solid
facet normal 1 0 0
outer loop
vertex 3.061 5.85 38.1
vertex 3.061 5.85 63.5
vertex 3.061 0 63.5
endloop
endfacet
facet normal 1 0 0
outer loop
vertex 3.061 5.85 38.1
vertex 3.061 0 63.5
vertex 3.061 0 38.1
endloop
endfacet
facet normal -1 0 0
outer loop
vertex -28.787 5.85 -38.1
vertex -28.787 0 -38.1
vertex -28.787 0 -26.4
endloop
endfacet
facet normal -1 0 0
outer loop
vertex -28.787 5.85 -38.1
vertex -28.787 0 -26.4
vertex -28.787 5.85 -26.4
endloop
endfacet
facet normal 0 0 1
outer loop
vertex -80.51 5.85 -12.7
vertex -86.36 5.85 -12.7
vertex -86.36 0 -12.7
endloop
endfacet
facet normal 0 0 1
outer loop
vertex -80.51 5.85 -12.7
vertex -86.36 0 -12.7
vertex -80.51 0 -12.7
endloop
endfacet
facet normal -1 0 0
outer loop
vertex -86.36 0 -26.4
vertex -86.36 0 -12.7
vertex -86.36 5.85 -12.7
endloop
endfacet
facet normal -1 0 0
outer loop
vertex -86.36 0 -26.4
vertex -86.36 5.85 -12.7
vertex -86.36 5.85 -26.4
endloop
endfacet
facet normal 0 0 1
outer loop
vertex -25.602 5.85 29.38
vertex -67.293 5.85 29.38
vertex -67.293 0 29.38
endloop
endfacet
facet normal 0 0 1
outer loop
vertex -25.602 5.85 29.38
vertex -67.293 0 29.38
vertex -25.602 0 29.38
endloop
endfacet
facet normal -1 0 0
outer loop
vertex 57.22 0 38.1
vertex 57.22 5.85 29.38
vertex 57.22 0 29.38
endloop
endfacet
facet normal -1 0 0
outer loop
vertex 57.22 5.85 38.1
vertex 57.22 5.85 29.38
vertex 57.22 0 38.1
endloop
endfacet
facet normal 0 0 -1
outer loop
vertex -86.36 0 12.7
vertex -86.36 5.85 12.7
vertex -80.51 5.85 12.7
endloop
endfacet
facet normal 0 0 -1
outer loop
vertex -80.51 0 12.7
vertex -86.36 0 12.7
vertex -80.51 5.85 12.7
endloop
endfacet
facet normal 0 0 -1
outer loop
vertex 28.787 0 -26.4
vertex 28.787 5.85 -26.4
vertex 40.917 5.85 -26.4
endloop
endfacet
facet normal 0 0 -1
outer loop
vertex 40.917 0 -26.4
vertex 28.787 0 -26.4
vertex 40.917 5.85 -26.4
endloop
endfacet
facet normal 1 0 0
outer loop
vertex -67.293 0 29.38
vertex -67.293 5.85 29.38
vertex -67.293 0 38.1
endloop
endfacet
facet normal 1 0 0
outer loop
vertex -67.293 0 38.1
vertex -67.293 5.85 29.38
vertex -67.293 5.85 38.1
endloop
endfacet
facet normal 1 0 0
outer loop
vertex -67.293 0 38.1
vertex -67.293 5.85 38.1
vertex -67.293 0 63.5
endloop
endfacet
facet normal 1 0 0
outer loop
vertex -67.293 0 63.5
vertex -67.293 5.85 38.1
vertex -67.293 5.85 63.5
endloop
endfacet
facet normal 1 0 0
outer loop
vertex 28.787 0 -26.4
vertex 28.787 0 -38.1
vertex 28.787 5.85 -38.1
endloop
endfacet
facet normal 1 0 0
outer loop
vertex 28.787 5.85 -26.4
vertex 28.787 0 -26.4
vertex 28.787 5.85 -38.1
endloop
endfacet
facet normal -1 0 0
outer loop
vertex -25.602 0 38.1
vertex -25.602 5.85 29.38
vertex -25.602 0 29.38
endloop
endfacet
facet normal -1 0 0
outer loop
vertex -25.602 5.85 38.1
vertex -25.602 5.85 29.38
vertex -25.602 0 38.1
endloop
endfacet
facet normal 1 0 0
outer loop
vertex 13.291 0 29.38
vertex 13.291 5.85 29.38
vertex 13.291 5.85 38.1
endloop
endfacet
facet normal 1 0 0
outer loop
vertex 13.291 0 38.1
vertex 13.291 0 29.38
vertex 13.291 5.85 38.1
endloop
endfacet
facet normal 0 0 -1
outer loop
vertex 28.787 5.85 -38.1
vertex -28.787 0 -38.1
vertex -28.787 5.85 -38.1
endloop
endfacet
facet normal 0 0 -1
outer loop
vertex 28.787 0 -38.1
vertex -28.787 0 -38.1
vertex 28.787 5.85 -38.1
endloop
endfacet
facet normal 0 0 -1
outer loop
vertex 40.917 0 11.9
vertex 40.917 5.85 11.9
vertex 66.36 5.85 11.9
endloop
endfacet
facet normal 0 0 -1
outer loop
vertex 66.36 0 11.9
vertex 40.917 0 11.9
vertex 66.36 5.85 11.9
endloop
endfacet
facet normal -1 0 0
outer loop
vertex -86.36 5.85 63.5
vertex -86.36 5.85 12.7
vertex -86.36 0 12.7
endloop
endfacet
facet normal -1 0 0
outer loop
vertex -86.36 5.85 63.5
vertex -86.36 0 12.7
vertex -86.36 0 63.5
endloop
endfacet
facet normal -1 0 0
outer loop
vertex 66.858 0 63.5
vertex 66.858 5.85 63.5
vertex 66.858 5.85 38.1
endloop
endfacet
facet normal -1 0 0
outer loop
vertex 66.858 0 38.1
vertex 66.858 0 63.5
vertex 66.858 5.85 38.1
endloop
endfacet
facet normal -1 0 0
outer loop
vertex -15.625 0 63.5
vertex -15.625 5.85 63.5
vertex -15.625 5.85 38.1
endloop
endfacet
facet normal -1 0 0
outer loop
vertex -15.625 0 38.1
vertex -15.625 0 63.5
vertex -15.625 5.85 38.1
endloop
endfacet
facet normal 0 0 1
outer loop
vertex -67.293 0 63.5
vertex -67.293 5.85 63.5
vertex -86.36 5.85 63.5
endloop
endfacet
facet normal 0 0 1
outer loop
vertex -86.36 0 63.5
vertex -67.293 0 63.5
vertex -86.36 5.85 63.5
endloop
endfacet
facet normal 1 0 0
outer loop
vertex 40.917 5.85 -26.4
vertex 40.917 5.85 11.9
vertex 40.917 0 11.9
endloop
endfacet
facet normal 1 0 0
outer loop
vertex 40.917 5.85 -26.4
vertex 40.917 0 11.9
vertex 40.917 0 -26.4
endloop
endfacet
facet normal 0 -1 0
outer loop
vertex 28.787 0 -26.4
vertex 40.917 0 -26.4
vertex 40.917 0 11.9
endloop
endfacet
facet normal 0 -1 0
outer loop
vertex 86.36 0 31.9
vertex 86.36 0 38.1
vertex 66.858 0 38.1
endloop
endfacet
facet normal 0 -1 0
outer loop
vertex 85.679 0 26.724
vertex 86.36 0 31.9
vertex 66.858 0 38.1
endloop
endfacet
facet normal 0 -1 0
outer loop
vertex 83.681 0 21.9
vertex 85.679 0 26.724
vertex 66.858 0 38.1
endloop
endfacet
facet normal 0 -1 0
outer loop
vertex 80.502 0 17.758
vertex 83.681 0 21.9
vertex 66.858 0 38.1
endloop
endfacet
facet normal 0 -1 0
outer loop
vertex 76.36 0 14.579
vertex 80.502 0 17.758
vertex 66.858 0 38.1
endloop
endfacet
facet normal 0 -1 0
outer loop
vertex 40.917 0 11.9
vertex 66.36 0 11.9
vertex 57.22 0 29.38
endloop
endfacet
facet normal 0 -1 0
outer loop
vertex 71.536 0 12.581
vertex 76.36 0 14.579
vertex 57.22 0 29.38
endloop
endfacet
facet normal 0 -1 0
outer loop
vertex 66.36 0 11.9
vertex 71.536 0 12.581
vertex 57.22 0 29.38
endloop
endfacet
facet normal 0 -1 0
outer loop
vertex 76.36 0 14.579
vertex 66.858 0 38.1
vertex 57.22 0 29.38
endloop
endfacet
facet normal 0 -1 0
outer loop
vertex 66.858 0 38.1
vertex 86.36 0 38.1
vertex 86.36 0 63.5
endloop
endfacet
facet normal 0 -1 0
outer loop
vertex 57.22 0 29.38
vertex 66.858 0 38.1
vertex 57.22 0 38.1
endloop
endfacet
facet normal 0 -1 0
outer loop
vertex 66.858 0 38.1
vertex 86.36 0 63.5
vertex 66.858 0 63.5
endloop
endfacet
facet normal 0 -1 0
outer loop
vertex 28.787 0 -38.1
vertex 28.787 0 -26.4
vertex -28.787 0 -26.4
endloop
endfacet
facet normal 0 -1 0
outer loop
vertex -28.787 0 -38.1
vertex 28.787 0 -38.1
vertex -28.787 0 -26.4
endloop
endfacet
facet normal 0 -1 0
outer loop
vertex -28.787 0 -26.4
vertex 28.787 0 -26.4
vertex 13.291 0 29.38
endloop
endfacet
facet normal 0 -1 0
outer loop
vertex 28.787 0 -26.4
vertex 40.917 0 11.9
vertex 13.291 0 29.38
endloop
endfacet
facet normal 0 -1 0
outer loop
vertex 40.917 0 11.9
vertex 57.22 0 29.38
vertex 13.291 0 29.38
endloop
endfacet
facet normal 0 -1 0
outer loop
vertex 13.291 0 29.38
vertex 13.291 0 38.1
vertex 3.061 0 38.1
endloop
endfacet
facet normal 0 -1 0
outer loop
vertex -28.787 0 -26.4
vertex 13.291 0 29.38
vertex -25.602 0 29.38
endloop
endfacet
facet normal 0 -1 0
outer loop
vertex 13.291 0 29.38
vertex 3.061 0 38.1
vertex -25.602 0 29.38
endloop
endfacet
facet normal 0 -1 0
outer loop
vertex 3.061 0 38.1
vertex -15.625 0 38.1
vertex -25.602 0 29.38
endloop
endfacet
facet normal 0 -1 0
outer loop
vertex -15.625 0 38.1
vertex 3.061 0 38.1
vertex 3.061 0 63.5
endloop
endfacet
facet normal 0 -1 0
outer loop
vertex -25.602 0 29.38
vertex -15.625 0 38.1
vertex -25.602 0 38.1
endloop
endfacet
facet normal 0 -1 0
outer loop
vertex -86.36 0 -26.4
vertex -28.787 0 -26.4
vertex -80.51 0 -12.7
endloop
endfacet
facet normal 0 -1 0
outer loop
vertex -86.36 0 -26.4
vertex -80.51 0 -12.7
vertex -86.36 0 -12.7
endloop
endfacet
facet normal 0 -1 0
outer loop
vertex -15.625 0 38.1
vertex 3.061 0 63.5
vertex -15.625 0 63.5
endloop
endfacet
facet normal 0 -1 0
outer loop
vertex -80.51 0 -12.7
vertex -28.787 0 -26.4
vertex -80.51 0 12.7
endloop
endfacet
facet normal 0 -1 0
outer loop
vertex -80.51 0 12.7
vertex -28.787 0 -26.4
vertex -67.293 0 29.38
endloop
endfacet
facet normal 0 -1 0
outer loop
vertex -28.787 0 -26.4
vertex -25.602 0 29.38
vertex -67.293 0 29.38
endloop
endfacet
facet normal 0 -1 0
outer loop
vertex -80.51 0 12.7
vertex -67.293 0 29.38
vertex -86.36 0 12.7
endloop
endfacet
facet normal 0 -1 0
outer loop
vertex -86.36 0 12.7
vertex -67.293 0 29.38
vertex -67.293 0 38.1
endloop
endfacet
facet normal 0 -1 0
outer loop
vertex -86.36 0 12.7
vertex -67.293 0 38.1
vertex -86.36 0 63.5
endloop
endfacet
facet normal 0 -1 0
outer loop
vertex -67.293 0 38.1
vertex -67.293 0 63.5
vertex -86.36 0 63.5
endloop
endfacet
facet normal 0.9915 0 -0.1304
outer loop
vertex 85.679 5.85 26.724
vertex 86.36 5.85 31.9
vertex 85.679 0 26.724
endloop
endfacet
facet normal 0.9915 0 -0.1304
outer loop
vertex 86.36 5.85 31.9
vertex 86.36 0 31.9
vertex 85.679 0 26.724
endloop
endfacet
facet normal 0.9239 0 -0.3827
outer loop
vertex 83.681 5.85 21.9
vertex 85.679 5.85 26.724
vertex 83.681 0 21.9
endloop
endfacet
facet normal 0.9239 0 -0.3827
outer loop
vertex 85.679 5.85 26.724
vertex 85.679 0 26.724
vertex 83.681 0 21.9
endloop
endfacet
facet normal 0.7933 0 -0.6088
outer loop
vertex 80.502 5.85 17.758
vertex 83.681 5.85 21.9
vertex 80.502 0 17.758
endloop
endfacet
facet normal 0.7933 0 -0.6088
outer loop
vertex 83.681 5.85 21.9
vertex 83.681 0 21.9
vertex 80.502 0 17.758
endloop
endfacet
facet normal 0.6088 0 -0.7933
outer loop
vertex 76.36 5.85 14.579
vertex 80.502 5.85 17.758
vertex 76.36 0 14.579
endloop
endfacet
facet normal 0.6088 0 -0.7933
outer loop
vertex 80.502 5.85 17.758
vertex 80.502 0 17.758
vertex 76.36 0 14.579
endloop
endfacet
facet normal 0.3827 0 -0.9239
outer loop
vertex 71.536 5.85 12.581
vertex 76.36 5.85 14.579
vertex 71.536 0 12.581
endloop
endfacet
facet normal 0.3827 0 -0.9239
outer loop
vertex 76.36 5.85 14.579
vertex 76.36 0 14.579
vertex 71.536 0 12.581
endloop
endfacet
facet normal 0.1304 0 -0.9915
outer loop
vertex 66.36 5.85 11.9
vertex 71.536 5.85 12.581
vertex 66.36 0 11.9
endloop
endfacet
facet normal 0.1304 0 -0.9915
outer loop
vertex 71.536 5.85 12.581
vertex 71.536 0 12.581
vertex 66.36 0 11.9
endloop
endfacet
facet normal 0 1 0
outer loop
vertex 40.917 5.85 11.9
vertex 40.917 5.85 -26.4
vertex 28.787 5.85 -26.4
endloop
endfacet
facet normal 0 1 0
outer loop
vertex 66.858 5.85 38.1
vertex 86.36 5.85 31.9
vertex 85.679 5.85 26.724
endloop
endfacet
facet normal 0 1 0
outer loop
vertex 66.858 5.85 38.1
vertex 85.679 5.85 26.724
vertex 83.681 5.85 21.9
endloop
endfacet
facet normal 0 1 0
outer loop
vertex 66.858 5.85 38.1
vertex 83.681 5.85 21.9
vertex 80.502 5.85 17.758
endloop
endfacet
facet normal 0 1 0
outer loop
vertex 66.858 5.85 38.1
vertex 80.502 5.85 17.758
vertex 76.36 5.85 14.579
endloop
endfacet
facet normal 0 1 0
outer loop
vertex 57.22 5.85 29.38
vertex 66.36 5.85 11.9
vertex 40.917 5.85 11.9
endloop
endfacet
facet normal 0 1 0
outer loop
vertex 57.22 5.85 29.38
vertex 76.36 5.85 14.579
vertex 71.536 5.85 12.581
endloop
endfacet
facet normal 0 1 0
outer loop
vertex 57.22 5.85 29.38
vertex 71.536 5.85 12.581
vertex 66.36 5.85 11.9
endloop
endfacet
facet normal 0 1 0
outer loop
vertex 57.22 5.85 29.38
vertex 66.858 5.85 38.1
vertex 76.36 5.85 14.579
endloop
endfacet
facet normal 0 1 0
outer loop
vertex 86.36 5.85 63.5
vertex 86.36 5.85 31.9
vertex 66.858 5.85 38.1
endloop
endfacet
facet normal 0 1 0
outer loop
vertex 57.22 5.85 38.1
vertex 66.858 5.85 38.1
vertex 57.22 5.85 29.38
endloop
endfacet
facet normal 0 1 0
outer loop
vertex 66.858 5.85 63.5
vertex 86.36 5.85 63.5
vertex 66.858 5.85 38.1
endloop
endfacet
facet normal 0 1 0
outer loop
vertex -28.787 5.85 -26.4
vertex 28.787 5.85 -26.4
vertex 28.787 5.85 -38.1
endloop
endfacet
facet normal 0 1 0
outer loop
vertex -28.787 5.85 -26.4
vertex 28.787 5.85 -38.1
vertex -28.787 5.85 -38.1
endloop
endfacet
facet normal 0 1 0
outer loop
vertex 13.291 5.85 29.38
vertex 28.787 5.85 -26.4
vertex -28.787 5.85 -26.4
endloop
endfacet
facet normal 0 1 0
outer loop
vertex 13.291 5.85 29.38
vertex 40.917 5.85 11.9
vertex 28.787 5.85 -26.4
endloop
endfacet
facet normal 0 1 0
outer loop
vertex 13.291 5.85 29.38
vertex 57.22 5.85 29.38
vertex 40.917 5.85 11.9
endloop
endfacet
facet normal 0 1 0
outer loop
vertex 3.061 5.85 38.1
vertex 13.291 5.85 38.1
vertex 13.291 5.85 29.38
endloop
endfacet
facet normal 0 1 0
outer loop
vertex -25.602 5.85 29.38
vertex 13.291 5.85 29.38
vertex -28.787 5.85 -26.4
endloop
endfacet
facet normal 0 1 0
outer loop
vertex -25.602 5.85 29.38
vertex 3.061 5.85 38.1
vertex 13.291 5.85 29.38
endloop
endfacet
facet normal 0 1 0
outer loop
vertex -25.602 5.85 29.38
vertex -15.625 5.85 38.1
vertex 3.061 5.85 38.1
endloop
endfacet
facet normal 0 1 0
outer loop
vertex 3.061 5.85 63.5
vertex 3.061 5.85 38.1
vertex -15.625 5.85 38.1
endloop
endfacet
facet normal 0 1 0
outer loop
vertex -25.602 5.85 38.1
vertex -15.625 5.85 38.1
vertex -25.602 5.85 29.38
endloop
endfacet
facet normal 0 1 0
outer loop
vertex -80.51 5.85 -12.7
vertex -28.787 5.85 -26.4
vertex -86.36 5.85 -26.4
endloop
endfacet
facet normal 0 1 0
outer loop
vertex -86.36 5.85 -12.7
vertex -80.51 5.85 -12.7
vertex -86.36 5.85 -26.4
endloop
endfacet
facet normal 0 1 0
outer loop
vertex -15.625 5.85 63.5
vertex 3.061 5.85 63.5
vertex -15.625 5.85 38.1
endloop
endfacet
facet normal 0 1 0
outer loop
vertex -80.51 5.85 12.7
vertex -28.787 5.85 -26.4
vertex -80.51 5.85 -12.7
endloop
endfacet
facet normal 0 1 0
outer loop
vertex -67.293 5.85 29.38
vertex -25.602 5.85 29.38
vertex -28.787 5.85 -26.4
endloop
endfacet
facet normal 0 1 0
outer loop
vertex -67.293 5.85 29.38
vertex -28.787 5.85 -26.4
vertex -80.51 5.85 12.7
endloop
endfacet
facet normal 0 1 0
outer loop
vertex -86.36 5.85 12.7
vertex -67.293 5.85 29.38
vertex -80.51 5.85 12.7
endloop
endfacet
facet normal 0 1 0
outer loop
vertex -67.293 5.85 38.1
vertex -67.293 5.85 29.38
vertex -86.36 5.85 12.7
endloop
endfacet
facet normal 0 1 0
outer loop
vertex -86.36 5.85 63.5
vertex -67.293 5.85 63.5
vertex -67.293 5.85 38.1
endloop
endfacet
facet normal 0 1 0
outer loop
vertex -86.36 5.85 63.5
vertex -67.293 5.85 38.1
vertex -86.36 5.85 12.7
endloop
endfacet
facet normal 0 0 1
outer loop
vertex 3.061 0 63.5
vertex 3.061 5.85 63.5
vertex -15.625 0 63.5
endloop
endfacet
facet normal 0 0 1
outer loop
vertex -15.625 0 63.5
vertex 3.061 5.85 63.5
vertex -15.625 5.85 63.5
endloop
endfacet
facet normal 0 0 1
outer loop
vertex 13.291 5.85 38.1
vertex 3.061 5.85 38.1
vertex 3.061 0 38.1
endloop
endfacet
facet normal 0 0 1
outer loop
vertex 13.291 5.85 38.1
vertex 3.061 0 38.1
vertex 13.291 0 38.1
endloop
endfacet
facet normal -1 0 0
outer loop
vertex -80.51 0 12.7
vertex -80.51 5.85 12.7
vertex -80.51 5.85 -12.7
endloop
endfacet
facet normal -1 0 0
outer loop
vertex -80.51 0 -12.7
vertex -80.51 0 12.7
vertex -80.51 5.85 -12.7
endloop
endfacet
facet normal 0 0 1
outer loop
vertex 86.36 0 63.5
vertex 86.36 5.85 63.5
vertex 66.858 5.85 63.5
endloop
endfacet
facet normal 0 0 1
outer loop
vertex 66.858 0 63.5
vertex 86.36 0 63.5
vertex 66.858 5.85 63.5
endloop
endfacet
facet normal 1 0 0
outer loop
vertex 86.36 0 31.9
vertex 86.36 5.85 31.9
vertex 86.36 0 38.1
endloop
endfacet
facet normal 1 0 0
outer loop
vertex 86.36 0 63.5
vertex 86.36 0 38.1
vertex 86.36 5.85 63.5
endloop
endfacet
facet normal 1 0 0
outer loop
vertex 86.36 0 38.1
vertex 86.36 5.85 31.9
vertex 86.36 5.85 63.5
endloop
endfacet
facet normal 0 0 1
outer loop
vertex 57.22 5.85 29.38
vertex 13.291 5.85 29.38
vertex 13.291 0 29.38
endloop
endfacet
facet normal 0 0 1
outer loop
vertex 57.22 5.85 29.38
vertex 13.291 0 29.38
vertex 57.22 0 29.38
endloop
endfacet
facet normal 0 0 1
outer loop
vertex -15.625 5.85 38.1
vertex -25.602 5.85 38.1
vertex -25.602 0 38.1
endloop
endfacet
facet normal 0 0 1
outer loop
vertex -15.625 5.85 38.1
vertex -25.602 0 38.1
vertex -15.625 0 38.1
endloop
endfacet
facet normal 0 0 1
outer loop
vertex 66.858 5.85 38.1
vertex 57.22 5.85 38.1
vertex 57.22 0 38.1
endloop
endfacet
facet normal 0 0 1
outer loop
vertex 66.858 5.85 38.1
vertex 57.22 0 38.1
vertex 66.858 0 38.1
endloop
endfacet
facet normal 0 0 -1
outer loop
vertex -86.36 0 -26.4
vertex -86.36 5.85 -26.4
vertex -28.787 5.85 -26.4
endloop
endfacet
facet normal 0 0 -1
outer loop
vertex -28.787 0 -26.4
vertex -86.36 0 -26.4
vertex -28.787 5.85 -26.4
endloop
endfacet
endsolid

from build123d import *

# Parameters (mm, degrees)
SKETCH1_W             = 172.72
SKETCH1_H             = 76.2
BOSS_EXTRUDE1_DEPTH   = 5.85
SKETCH2_W             = 5.85
SKETCH2_H             = 25.4
SKETCH2_W_2           = 41.691074393
SKETCH2_H_2           = 8.720383817
SKETCH2_W_3           = 43.92952134
SKETCH2_W_4           = 45.443124842
SKETCH2_H_3           = 50
CUT_EXTRUDE1_DEPTH    = 10
SKETCH3_W             = 29.139699911
SKETCH3_H             = 25.4
BOSS_EXTRUDE2_DEPTH   = 5.85
SKETCH3_W_2           = 38.893015708
BOSS_EXTRUDE2_2_DEPTH = 5.85
SKETCH3_W_3           = 19.066688648
BOSS_EXTRUDE2_3_DEPTH = 5.85
SKETCH4_W             = 9.977498033
SKETCH4_H             = 25.4
SKETCH4_W_2           = 10.229966749
SKETCH4_W_3           = 9.637990001
CUT_EXTRUDE2_DEPTH    = 10
CAVITY1_START         = -38.1
CAVITY1_OUTLINE_W     = 12.130208491
CAVITY1_OUTLINE_H     = 5.85
CAVITY1_OUTLINE_W_2   = 57.573333333
CAVITY1_DEPTH         = 11.7
FILLET2_R             = 20


# Read off the part's stored shape, not the designer's step: Cavity1
with BuildPart() as part:
    # Sketch1 → Boss-Extrude1 (new body)
    with BuildSketch(Plane(origin=(0, 0, 0), x_dir=(1, 0, 0), z_dir=(0, 1, 0))):
        Rectangle(SKETCH1_W, SKETCH1_H)
    extrude(amount=BOSS_EXTRUDE1_DEPTH)

    # Sketch2 → Cut-Extrude1 (cut)
    with BuildSketch(Plane(origin=(0, 5.85, 0), x_dir=(1, 0, 0), z_dir=(0, 1, 0))):
        with Locations((-83.435, 0)):
            Rectangle(SKETCH2_W, SKETCH2_H)
        with Locations((-46.447774155, -33.739808092)):
            Rectangle(SKETCH2_W_2, SKETCH2_H_2)
        with Locations((35.255539419, -33.739808092)):
            Rectangle(SKETCH2_W_3, SKETCH2_H_2)
        with Locations((63.638437579, 13.1)):
            Rectangle(SKETCH2_W_4, SKETCH2_H_3)
    extrude(amount=-CUT_EXTRUDE1_DEPTH, mode=Mode.SUBTRACT)


with BuildPart() as body_2:
    # Sketch3 → Boss-Extrude2 (new body)
    with BuildSketch(Plane(origin=(0, 5.85, 0), x_dir=(-1, 0, 0), z_dir=(0, 1, 0))):
        with Locations((-71.790150044, 50.8)):
            Rectangle(SKETCH3_W, SKETCH3_H)
    extrude(amount=-BOSS_EXTRUDE2_DEPTH)


with BuildPart() as body_3:
    # Sketch3 → Boss-Extrude2 2 (new body)
    with BuildSketch(Plane(origin=(0, 5.85, 0), x_dir=(-1, 0, 0), z_dir=(0, 1, 0))):
        with Locations((6.155729105, 50.8)):
            Rectangle(SKETCH3_W_2, SKETCH3_H)
    extrude(amount=-BOSS_EXTRUDE2_2_DEPTH)


with BuildPart() as body_4:
    # Sketch3 → Boss-Extrude2 3 (new body)
    with BuildSketch(Plane(origin=(0, 5.85, 0), x_dir=(-1, 0, 0), z_dir=(0, 1, 0))):
        with Locations((76.826655676, 50.8)):
            Rectangle(SKETCH3_W_3, SKETCH3_H)
    extrude(amount=-BOSS_EXTRUDE2_3_DEPTH)


with BuildPart() as part_1:
    add(part.part)

    # Combine1: union body 4, body 3, body 2
    add(body_4.part)
    add(body_3.part)
    add(body_2.part)

    # Sketch4 → Cut-Extrude2 (cut)
    with BuildSketch(Plane(origin=(0, 5.85, 0), x_dir=(1, 0, 0), z_dir=(0, 1, 0))):
        with Locations((-20.613487943, -50.8)):
            Rectangle(SKETCH4_W, SKETCH4_H)
        with Locations((8.175795375, -50.8)):
            Rectangle(SKETCH4_W_2, SKETCH4_H)
        with Locations((62.03929509, -50.8)):
            Rectangle(SKETCH4_W_3, SKETCH4_H)
    extrude(amount=-CUT_EXTRUDE2_DEPTH, mode=Mode.SUBTRACT)

    # Cavity1 outline → Cavity1 (cut)
    with BuildSketch(Plane.XY.offset(CAVITY1_START)):
        with Locations((34.851770913, 2.925)):
            Rectangle(CAVITY1_OUTLINE_W, CAVITY1_OUTLINE_H)
        with Locations((-57.573333334, 2.925)):
            Rectangle(CAVITY1_OUTLINE_W_2, CAVITY1_OUTLINE_H)
    extrude(amount=CAVITY1_DEPTH, mode=Mode.SUBTRACT)

    # Fillet2
    fillet2_edges = [part_1.edges().sort_by_distance(p)[0] for p in [
        (86.36, 2.925, 11.9),
    ]]
    fillet(fillet2_edges, radius=FILLET2_R)


solid = part_1.part
